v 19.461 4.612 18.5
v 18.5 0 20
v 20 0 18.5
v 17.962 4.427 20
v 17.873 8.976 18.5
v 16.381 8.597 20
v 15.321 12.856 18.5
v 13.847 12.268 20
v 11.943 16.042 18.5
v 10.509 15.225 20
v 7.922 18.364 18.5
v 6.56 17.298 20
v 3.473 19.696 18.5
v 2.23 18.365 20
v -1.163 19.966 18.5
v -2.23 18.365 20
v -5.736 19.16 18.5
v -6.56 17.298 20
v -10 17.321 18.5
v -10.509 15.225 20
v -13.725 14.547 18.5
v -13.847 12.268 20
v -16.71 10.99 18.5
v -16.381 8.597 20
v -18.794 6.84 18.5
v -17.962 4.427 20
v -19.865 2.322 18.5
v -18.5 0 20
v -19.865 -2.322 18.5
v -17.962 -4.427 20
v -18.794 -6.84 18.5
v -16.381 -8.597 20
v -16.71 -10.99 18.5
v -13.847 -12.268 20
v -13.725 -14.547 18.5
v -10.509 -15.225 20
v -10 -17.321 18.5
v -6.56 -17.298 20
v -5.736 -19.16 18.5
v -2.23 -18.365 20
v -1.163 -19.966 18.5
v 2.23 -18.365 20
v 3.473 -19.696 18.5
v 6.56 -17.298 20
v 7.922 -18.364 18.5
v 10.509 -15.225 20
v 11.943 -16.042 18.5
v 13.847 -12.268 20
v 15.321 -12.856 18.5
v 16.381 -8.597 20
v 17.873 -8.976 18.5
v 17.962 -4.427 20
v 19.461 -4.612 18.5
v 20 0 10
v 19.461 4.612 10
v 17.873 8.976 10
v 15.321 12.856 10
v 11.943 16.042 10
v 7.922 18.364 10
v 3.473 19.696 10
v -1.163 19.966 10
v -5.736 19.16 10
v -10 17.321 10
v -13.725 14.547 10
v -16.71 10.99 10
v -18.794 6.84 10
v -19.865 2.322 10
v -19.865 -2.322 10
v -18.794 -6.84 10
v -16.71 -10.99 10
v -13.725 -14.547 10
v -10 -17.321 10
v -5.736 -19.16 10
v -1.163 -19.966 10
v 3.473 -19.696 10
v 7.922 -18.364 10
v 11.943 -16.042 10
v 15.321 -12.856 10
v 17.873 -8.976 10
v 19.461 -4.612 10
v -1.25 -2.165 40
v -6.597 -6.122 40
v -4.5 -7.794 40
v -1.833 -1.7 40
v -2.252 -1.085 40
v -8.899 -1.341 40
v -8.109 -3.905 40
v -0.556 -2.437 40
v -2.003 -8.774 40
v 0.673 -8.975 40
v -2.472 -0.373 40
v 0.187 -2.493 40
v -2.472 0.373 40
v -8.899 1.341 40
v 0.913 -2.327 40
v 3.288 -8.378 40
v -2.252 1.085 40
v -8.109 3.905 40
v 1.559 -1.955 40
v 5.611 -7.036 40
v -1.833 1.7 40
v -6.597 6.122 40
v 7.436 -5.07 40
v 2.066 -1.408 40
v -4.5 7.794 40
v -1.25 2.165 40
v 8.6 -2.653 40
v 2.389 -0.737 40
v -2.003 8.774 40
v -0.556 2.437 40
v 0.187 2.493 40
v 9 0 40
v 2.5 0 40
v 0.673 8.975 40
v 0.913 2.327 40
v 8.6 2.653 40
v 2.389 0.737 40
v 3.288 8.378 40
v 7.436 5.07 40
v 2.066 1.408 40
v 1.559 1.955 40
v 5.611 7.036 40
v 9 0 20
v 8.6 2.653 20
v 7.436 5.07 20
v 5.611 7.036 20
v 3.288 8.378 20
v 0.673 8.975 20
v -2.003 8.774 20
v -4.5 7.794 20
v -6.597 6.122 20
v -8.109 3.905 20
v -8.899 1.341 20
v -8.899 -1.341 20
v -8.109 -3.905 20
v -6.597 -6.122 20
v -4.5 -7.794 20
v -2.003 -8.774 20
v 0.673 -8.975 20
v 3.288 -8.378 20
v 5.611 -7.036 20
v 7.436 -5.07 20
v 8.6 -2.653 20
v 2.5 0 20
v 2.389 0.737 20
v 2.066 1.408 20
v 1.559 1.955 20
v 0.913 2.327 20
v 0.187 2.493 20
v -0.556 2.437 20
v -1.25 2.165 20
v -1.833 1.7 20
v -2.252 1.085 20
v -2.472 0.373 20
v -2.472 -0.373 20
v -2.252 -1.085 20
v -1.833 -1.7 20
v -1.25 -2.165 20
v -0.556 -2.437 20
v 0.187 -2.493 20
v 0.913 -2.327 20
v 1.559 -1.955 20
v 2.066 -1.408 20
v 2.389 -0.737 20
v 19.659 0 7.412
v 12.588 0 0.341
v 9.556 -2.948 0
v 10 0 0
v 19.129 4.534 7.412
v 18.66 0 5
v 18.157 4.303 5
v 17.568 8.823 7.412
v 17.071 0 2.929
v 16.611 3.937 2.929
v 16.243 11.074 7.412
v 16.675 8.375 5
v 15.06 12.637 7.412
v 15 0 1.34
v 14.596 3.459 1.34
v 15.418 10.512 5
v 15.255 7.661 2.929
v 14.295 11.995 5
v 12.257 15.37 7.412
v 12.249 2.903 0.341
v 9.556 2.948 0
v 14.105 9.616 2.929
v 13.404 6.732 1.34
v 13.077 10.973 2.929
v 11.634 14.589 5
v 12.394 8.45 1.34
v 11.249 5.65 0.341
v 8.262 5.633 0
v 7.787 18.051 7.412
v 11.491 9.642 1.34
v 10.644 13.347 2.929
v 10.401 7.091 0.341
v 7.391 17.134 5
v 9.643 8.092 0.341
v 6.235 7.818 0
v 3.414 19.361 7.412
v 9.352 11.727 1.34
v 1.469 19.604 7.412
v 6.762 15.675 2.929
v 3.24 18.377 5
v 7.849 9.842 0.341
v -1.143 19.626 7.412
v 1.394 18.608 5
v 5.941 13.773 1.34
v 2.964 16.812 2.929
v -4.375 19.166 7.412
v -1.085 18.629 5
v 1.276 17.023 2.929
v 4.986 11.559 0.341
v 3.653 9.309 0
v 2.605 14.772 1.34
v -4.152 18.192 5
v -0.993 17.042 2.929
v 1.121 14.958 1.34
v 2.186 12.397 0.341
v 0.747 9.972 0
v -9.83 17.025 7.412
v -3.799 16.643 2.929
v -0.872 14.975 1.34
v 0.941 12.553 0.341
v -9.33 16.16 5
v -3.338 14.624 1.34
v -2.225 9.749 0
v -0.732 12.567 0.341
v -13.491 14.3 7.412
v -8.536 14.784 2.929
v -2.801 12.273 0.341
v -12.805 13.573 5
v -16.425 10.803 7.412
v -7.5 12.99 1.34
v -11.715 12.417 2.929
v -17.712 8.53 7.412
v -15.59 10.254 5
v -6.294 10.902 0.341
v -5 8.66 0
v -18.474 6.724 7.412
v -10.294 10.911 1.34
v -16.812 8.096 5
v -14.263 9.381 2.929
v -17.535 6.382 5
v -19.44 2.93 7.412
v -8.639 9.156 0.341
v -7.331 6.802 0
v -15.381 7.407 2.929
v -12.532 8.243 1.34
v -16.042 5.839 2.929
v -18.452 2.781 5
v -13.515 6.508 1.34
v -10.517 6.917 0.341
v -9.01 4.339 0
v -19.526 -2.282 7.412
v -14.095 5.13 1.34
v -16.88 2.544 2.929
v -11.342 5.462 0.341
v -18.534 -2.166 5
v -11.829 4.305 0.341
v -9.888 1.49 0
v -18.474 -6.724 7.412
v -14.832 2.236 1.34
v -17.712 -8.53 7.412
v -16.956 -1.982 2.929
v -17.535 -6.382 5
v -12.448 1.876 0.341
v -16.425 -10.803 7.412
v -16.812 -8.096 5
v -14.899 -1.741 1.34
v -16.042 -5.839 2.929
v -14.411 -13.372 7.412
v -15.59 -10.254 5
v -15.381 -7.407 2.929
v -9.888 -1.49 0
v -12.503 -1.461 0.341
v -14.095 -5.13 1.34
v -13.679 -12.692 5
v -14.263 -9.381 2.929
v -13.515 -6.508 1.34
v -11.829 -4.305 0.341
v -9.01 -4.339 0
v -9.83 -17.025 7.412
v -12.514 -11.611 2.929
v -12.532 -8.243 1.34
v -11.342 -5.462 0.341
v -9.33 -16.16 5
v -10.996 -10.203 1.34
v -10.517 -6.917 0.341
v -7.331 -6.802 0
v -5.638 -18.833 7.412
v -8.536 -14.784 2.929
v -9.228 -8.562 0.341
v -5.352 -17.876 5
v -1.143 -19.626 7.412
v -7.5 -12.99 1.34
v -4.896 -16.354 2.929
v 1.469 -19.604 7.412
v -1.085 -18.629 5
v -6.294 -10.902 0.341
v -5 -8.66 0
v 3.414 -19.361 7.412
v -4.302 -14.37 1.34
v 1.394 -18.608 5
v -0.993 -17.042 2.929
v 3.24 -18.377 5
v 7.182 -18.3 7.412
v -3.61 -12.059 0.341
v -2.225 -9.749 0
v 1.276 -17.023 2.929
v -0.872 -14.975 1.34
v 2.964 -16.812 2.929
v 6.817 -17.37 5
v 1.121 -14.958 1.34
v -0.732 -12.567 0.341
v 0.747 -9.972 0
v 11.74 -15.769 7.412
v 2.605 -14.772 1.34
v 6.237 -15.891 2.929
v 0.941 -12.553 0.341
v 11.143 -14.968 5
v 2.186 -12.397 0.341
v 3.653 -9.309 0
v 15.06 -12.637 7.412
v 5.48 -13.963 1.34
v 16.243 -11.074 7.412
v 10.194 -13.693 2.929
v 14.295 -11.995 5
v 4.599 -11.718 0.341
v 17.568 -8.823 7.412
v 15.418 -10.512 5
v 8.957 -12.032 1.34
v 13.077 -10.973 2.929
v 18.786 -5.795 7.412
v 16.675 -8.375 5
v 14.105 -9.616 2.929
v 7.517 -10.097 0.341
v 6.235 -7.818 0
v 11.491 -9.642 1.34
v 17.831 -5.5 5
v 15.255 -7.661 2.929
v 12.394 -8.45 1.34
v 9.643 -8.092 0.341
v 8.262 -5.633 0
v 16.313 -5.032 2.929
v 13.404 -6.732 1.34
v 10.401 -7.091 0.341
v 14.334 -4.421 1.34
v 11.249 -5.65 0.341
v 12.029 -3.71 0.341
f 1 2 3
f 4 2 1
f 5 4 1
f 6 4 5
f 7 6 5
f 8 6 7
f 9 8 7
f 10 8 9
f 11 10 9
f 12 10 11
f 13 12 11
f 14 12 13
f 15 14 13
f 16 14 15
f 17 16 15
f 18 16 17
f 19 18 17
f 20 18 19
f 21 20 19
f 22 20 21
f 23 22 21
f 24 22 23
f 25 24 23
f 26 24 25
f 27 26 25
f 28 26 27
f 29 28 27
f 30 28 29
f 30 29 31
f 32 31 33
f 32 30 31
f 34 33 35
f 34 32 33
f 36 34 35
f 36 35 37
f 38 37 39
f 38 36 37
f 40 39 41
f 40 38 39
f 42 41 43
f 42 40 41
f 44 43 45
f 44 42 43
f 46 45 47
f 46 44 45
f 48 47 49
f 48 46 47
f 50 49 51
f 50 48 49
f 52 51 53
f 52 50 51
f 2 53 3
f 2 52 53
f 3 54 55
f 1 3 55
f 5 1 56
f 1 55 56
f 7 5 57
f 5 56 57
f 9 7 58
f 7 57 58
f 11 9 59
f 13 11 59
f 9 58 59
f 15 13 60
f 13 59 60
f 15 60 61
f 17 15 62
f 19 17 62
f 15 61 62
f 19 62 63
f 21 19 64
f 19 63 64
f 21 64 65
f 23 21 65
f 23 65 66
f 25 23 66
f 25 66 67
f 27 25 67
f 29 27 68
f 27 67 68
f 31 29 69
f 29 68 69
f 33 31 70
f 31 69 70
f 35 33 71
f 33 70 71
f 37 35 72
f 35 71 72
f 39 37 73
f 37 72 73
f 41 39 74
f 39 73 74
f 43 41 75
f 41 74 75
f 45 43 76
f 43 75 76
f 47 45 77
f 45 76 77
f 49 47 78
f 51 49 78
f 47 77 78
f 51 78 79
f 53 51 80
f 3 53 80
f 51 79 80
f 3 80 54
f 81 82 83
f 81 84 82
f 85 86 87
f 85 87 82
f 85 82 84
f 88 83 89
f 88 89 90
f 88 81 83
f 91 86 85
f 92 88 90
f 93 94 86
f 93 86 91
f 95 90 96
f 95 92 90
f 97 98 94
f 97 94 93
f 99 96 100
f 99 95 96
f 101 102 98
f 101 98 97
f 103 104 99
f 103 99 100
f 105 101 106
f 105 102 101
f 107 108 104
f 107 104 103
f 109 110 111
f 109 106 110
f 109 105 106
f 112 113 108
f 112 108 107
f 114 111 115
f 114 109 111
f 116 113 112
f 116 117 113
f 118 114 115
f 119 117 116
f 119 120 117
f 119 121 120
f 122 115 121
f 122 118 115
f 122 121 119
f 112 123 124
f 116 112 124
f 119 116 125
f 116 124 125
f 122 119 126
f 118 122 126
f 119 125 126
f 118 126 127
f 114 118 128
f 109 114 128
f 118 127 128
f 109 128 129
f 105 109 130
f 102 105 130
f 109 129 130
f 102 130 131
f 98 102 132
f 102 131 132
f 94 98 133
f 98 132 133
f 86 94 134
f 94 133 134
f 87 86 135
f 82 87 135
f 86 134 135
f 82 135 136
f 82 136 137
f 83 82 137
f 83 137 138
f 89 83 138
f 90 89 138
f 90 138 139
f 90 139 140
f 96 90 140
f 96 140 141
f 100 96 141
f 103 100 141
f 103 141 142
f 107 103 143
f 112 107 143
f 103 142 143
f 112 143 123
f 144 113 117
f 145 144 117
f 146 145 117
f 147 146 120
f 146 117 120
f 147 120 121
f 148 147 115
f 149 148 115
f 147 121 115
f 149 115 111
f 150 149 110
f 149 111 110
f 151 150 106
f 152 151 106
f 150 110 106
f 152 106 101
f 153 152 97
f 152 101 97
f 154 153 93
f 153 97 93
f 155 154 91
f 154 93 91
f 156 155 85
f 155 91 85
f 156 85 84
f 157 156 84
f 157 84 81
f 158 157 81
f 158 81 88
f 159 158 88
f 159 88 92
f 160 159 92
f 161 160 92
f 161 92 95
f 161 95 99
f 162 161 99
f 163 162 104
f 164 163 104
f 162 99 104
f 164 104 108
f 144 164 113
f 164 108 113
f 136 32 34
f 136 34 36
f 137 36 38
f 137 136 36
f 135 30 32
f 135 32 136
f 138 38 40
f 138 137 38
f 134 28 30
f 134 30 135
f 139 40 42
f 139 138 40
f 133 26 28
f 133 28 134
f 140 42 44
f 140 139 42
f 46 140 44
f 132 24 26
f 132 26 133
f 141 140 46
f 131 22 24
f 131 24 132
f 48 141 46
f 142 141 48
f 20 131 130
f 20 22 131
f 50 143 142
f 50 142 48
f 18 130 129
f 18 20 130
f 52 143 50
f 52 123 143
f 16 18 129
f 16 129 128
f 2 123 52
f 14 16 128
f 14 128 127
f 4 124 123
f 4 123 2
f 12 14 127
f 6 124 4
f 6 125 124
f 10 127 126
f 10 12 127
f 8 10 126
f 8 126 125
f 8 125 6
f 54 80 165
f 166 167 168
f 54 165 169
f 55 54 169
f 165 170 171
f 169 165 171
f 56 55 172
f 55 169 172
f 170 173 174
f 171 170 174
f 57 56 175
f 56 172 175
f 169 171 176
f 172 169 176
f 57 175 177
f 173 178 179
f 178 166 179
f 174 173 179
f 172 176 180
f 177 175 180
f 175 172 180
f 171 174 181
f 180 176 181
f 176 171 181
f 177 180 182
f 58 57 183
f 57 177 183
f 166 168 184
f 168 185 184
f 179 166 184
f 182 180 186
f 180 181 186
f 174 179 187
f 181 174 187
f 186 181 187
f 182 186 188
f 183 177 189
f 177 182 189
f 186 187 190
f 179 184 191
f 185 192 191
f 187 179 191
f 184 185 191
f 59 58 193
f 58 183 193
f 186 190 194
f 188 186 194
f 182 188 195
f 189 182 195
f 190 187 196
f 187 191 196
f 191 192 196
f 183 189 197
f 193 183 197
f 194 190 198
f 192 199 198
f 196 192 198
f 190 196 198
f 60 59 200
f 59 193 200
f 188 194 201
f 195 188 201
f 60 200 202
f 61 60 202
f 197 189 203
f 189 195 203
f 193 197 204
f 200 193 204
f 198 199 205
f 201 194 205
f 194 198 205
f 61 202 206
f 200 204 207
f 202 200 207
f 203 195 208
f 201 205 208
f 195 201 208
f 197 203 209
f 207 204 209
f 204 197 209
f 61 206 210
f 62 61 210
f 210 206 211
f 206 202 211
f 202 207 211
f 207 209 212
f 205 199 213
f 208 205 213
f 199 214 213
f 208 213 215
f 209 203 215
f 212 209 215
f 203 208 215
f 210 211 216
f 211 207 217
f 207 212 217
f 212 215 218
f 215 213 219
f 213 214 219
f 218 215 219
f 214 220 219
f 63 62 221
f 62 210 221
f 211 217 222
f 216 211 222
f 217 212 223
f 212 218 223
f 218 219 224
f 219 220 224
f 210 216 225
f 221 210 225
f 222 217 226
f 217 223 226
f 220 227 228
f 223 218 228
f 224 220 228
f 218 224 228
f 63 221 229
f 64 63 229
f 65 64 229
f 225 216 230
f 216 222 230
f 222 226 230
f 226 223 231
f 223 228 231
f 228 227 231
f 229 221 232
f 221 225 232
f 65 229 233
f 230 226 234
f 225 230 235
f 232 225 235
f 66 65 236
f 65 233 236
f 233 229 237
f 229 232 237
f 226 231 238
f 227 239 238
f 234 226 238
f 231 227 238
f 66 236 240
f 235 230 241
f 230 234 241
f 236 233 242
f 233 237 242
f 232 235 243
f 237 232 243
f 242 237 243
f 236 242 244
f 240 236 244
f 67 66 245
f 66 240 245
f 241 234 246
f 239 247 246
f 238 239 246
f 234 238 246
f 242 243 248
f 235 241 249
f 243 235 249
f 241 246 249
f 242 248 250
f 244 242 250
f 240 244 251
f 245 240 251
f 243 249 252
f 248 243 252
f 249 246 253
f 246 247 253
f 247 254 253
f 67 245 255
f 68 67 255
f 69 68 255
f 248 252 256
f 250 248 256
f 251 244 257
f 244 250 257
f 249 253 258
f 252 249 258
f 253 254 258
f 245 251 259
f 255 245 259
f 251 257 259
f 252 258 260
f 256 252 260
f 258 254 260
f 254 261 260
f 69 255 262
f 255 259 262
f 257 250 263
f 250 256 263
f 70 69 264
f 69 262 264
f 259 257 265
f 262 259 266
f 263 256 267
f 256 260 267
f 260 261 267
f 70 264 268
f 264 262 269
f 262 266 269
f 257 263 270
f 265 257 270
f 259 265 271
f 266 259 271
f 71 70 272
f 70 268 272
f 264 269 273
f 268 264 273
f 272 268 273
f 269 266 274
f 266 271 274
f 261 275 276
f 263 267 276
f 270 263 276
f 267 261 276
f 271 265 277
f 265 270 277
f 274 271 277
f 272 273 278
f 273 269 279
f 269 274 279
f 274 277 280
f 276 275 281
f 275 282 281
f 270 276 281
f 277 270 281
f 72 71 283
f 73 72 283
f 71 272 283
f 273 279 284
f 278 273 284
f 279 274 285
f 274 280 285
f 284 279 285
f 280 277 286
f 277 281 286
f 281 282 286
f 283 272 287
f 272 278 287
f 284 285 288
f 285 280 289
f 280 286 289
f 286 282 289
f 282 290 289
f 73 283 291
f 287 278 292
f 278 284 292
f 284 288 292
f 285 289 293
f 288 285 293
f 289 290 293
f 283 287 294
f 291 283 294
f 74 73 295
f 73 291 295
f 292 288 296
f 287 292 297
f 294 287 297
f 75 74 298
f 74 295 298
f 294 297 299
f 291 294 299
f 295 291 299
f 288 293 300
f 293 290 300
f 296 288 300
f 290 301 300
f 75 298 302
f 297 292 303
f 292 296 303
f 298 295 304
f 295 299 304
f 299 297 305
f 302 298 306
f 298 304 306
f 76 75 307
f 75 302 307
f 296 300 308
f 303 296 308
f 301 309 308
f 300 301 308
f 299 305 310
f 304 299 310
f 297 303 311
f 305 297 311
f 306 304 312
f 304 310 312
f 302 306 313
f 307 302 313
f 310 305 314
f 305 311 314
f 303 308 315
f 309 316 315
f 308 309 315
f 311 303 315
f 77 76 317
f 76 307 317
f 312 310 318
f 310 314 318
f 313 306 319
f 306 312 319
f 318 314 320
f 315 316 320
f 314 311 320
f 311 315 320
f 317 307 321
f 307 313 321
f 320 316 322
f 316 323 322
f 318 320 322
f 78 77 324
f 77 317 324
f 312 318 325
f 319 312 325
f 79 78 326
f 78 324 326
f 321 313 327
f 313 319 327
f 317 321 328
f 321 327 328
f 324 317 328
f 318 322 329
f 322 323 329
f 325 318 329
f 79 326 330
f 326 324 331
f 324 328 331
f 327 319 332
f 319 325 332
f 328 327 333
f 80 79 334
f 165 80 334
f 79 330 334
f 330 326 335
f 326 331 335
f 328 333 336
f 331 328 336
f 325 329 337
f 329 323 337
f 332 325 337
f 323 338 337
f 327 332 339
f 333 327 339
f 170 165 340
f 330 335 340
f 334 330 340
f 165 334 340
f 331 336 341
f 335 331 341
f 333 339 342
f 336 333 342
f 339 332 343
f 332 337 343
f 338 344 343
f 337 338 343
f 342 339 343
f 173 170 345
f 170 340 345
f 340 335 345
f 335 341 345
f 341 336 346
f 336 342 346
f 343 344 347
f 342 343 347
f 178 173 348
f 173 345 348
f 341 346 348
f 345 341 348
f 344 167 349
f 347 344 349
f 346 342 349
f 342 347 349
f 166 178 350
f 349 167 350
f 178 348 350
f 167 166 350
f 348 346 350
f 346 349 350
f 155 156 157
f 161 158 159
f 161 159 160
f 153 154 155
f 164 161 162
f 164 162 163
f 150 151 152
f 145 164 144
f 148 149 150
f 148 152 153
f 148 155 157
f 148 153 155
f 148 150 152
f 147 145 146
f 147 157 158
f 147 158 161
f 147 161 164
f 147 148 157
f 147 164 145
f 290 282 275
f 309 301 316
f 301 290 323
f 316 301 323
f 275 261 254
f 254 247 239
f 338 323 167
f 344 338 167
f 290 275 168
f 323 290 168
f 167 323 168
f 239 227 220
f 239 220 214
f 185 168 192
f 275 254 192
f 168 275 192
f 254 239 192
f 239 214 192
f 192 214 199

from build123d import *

# Parameters (mm, degrees)
F0_R     = 20
F1_DEPTH = 20
F2_R     = 10
F3_R     = 9
F4_DEPTH = 20
F5_R     = 2.5
F6_DEPTH = 20
F7_SIZE  = 1.5


with BuildPart() as f1:
    # F0 (on Top) → F1 (new body)
    with BuildSketch(Plane.XY):
        Circle(F0_R)
    extrude(amount=F1_DEPTH)

    # F2
    f2_edges = [f1.edges().sort_by_distance(p)[0] for p in [
        (-20, 0, 0),
    ]]
    fillet(f2_edges, radius=F2_R)

    # F3 (on face) → F4 (join)
    with BuildSketch(Plane.XY.offset(20)):
        Circle(F3_R)
    extrude(amount=F4_DEPTH)

    # F5 (on face) → F6 (cut)
    with BuildSketch(Plane.XY.offset(40)):
        Circle(F5_R)
    extrude(amount=-F6_DEPTH, mode=Mode.SUBTRACT)

    # F7
    f7_edges = [f1.edges().sort_by_distance(p)[0] for p in [
        (-20, 0, 20),
    ]]
    chamfer(f7_edges, length=F7_SIZE)


solid = f1.part
